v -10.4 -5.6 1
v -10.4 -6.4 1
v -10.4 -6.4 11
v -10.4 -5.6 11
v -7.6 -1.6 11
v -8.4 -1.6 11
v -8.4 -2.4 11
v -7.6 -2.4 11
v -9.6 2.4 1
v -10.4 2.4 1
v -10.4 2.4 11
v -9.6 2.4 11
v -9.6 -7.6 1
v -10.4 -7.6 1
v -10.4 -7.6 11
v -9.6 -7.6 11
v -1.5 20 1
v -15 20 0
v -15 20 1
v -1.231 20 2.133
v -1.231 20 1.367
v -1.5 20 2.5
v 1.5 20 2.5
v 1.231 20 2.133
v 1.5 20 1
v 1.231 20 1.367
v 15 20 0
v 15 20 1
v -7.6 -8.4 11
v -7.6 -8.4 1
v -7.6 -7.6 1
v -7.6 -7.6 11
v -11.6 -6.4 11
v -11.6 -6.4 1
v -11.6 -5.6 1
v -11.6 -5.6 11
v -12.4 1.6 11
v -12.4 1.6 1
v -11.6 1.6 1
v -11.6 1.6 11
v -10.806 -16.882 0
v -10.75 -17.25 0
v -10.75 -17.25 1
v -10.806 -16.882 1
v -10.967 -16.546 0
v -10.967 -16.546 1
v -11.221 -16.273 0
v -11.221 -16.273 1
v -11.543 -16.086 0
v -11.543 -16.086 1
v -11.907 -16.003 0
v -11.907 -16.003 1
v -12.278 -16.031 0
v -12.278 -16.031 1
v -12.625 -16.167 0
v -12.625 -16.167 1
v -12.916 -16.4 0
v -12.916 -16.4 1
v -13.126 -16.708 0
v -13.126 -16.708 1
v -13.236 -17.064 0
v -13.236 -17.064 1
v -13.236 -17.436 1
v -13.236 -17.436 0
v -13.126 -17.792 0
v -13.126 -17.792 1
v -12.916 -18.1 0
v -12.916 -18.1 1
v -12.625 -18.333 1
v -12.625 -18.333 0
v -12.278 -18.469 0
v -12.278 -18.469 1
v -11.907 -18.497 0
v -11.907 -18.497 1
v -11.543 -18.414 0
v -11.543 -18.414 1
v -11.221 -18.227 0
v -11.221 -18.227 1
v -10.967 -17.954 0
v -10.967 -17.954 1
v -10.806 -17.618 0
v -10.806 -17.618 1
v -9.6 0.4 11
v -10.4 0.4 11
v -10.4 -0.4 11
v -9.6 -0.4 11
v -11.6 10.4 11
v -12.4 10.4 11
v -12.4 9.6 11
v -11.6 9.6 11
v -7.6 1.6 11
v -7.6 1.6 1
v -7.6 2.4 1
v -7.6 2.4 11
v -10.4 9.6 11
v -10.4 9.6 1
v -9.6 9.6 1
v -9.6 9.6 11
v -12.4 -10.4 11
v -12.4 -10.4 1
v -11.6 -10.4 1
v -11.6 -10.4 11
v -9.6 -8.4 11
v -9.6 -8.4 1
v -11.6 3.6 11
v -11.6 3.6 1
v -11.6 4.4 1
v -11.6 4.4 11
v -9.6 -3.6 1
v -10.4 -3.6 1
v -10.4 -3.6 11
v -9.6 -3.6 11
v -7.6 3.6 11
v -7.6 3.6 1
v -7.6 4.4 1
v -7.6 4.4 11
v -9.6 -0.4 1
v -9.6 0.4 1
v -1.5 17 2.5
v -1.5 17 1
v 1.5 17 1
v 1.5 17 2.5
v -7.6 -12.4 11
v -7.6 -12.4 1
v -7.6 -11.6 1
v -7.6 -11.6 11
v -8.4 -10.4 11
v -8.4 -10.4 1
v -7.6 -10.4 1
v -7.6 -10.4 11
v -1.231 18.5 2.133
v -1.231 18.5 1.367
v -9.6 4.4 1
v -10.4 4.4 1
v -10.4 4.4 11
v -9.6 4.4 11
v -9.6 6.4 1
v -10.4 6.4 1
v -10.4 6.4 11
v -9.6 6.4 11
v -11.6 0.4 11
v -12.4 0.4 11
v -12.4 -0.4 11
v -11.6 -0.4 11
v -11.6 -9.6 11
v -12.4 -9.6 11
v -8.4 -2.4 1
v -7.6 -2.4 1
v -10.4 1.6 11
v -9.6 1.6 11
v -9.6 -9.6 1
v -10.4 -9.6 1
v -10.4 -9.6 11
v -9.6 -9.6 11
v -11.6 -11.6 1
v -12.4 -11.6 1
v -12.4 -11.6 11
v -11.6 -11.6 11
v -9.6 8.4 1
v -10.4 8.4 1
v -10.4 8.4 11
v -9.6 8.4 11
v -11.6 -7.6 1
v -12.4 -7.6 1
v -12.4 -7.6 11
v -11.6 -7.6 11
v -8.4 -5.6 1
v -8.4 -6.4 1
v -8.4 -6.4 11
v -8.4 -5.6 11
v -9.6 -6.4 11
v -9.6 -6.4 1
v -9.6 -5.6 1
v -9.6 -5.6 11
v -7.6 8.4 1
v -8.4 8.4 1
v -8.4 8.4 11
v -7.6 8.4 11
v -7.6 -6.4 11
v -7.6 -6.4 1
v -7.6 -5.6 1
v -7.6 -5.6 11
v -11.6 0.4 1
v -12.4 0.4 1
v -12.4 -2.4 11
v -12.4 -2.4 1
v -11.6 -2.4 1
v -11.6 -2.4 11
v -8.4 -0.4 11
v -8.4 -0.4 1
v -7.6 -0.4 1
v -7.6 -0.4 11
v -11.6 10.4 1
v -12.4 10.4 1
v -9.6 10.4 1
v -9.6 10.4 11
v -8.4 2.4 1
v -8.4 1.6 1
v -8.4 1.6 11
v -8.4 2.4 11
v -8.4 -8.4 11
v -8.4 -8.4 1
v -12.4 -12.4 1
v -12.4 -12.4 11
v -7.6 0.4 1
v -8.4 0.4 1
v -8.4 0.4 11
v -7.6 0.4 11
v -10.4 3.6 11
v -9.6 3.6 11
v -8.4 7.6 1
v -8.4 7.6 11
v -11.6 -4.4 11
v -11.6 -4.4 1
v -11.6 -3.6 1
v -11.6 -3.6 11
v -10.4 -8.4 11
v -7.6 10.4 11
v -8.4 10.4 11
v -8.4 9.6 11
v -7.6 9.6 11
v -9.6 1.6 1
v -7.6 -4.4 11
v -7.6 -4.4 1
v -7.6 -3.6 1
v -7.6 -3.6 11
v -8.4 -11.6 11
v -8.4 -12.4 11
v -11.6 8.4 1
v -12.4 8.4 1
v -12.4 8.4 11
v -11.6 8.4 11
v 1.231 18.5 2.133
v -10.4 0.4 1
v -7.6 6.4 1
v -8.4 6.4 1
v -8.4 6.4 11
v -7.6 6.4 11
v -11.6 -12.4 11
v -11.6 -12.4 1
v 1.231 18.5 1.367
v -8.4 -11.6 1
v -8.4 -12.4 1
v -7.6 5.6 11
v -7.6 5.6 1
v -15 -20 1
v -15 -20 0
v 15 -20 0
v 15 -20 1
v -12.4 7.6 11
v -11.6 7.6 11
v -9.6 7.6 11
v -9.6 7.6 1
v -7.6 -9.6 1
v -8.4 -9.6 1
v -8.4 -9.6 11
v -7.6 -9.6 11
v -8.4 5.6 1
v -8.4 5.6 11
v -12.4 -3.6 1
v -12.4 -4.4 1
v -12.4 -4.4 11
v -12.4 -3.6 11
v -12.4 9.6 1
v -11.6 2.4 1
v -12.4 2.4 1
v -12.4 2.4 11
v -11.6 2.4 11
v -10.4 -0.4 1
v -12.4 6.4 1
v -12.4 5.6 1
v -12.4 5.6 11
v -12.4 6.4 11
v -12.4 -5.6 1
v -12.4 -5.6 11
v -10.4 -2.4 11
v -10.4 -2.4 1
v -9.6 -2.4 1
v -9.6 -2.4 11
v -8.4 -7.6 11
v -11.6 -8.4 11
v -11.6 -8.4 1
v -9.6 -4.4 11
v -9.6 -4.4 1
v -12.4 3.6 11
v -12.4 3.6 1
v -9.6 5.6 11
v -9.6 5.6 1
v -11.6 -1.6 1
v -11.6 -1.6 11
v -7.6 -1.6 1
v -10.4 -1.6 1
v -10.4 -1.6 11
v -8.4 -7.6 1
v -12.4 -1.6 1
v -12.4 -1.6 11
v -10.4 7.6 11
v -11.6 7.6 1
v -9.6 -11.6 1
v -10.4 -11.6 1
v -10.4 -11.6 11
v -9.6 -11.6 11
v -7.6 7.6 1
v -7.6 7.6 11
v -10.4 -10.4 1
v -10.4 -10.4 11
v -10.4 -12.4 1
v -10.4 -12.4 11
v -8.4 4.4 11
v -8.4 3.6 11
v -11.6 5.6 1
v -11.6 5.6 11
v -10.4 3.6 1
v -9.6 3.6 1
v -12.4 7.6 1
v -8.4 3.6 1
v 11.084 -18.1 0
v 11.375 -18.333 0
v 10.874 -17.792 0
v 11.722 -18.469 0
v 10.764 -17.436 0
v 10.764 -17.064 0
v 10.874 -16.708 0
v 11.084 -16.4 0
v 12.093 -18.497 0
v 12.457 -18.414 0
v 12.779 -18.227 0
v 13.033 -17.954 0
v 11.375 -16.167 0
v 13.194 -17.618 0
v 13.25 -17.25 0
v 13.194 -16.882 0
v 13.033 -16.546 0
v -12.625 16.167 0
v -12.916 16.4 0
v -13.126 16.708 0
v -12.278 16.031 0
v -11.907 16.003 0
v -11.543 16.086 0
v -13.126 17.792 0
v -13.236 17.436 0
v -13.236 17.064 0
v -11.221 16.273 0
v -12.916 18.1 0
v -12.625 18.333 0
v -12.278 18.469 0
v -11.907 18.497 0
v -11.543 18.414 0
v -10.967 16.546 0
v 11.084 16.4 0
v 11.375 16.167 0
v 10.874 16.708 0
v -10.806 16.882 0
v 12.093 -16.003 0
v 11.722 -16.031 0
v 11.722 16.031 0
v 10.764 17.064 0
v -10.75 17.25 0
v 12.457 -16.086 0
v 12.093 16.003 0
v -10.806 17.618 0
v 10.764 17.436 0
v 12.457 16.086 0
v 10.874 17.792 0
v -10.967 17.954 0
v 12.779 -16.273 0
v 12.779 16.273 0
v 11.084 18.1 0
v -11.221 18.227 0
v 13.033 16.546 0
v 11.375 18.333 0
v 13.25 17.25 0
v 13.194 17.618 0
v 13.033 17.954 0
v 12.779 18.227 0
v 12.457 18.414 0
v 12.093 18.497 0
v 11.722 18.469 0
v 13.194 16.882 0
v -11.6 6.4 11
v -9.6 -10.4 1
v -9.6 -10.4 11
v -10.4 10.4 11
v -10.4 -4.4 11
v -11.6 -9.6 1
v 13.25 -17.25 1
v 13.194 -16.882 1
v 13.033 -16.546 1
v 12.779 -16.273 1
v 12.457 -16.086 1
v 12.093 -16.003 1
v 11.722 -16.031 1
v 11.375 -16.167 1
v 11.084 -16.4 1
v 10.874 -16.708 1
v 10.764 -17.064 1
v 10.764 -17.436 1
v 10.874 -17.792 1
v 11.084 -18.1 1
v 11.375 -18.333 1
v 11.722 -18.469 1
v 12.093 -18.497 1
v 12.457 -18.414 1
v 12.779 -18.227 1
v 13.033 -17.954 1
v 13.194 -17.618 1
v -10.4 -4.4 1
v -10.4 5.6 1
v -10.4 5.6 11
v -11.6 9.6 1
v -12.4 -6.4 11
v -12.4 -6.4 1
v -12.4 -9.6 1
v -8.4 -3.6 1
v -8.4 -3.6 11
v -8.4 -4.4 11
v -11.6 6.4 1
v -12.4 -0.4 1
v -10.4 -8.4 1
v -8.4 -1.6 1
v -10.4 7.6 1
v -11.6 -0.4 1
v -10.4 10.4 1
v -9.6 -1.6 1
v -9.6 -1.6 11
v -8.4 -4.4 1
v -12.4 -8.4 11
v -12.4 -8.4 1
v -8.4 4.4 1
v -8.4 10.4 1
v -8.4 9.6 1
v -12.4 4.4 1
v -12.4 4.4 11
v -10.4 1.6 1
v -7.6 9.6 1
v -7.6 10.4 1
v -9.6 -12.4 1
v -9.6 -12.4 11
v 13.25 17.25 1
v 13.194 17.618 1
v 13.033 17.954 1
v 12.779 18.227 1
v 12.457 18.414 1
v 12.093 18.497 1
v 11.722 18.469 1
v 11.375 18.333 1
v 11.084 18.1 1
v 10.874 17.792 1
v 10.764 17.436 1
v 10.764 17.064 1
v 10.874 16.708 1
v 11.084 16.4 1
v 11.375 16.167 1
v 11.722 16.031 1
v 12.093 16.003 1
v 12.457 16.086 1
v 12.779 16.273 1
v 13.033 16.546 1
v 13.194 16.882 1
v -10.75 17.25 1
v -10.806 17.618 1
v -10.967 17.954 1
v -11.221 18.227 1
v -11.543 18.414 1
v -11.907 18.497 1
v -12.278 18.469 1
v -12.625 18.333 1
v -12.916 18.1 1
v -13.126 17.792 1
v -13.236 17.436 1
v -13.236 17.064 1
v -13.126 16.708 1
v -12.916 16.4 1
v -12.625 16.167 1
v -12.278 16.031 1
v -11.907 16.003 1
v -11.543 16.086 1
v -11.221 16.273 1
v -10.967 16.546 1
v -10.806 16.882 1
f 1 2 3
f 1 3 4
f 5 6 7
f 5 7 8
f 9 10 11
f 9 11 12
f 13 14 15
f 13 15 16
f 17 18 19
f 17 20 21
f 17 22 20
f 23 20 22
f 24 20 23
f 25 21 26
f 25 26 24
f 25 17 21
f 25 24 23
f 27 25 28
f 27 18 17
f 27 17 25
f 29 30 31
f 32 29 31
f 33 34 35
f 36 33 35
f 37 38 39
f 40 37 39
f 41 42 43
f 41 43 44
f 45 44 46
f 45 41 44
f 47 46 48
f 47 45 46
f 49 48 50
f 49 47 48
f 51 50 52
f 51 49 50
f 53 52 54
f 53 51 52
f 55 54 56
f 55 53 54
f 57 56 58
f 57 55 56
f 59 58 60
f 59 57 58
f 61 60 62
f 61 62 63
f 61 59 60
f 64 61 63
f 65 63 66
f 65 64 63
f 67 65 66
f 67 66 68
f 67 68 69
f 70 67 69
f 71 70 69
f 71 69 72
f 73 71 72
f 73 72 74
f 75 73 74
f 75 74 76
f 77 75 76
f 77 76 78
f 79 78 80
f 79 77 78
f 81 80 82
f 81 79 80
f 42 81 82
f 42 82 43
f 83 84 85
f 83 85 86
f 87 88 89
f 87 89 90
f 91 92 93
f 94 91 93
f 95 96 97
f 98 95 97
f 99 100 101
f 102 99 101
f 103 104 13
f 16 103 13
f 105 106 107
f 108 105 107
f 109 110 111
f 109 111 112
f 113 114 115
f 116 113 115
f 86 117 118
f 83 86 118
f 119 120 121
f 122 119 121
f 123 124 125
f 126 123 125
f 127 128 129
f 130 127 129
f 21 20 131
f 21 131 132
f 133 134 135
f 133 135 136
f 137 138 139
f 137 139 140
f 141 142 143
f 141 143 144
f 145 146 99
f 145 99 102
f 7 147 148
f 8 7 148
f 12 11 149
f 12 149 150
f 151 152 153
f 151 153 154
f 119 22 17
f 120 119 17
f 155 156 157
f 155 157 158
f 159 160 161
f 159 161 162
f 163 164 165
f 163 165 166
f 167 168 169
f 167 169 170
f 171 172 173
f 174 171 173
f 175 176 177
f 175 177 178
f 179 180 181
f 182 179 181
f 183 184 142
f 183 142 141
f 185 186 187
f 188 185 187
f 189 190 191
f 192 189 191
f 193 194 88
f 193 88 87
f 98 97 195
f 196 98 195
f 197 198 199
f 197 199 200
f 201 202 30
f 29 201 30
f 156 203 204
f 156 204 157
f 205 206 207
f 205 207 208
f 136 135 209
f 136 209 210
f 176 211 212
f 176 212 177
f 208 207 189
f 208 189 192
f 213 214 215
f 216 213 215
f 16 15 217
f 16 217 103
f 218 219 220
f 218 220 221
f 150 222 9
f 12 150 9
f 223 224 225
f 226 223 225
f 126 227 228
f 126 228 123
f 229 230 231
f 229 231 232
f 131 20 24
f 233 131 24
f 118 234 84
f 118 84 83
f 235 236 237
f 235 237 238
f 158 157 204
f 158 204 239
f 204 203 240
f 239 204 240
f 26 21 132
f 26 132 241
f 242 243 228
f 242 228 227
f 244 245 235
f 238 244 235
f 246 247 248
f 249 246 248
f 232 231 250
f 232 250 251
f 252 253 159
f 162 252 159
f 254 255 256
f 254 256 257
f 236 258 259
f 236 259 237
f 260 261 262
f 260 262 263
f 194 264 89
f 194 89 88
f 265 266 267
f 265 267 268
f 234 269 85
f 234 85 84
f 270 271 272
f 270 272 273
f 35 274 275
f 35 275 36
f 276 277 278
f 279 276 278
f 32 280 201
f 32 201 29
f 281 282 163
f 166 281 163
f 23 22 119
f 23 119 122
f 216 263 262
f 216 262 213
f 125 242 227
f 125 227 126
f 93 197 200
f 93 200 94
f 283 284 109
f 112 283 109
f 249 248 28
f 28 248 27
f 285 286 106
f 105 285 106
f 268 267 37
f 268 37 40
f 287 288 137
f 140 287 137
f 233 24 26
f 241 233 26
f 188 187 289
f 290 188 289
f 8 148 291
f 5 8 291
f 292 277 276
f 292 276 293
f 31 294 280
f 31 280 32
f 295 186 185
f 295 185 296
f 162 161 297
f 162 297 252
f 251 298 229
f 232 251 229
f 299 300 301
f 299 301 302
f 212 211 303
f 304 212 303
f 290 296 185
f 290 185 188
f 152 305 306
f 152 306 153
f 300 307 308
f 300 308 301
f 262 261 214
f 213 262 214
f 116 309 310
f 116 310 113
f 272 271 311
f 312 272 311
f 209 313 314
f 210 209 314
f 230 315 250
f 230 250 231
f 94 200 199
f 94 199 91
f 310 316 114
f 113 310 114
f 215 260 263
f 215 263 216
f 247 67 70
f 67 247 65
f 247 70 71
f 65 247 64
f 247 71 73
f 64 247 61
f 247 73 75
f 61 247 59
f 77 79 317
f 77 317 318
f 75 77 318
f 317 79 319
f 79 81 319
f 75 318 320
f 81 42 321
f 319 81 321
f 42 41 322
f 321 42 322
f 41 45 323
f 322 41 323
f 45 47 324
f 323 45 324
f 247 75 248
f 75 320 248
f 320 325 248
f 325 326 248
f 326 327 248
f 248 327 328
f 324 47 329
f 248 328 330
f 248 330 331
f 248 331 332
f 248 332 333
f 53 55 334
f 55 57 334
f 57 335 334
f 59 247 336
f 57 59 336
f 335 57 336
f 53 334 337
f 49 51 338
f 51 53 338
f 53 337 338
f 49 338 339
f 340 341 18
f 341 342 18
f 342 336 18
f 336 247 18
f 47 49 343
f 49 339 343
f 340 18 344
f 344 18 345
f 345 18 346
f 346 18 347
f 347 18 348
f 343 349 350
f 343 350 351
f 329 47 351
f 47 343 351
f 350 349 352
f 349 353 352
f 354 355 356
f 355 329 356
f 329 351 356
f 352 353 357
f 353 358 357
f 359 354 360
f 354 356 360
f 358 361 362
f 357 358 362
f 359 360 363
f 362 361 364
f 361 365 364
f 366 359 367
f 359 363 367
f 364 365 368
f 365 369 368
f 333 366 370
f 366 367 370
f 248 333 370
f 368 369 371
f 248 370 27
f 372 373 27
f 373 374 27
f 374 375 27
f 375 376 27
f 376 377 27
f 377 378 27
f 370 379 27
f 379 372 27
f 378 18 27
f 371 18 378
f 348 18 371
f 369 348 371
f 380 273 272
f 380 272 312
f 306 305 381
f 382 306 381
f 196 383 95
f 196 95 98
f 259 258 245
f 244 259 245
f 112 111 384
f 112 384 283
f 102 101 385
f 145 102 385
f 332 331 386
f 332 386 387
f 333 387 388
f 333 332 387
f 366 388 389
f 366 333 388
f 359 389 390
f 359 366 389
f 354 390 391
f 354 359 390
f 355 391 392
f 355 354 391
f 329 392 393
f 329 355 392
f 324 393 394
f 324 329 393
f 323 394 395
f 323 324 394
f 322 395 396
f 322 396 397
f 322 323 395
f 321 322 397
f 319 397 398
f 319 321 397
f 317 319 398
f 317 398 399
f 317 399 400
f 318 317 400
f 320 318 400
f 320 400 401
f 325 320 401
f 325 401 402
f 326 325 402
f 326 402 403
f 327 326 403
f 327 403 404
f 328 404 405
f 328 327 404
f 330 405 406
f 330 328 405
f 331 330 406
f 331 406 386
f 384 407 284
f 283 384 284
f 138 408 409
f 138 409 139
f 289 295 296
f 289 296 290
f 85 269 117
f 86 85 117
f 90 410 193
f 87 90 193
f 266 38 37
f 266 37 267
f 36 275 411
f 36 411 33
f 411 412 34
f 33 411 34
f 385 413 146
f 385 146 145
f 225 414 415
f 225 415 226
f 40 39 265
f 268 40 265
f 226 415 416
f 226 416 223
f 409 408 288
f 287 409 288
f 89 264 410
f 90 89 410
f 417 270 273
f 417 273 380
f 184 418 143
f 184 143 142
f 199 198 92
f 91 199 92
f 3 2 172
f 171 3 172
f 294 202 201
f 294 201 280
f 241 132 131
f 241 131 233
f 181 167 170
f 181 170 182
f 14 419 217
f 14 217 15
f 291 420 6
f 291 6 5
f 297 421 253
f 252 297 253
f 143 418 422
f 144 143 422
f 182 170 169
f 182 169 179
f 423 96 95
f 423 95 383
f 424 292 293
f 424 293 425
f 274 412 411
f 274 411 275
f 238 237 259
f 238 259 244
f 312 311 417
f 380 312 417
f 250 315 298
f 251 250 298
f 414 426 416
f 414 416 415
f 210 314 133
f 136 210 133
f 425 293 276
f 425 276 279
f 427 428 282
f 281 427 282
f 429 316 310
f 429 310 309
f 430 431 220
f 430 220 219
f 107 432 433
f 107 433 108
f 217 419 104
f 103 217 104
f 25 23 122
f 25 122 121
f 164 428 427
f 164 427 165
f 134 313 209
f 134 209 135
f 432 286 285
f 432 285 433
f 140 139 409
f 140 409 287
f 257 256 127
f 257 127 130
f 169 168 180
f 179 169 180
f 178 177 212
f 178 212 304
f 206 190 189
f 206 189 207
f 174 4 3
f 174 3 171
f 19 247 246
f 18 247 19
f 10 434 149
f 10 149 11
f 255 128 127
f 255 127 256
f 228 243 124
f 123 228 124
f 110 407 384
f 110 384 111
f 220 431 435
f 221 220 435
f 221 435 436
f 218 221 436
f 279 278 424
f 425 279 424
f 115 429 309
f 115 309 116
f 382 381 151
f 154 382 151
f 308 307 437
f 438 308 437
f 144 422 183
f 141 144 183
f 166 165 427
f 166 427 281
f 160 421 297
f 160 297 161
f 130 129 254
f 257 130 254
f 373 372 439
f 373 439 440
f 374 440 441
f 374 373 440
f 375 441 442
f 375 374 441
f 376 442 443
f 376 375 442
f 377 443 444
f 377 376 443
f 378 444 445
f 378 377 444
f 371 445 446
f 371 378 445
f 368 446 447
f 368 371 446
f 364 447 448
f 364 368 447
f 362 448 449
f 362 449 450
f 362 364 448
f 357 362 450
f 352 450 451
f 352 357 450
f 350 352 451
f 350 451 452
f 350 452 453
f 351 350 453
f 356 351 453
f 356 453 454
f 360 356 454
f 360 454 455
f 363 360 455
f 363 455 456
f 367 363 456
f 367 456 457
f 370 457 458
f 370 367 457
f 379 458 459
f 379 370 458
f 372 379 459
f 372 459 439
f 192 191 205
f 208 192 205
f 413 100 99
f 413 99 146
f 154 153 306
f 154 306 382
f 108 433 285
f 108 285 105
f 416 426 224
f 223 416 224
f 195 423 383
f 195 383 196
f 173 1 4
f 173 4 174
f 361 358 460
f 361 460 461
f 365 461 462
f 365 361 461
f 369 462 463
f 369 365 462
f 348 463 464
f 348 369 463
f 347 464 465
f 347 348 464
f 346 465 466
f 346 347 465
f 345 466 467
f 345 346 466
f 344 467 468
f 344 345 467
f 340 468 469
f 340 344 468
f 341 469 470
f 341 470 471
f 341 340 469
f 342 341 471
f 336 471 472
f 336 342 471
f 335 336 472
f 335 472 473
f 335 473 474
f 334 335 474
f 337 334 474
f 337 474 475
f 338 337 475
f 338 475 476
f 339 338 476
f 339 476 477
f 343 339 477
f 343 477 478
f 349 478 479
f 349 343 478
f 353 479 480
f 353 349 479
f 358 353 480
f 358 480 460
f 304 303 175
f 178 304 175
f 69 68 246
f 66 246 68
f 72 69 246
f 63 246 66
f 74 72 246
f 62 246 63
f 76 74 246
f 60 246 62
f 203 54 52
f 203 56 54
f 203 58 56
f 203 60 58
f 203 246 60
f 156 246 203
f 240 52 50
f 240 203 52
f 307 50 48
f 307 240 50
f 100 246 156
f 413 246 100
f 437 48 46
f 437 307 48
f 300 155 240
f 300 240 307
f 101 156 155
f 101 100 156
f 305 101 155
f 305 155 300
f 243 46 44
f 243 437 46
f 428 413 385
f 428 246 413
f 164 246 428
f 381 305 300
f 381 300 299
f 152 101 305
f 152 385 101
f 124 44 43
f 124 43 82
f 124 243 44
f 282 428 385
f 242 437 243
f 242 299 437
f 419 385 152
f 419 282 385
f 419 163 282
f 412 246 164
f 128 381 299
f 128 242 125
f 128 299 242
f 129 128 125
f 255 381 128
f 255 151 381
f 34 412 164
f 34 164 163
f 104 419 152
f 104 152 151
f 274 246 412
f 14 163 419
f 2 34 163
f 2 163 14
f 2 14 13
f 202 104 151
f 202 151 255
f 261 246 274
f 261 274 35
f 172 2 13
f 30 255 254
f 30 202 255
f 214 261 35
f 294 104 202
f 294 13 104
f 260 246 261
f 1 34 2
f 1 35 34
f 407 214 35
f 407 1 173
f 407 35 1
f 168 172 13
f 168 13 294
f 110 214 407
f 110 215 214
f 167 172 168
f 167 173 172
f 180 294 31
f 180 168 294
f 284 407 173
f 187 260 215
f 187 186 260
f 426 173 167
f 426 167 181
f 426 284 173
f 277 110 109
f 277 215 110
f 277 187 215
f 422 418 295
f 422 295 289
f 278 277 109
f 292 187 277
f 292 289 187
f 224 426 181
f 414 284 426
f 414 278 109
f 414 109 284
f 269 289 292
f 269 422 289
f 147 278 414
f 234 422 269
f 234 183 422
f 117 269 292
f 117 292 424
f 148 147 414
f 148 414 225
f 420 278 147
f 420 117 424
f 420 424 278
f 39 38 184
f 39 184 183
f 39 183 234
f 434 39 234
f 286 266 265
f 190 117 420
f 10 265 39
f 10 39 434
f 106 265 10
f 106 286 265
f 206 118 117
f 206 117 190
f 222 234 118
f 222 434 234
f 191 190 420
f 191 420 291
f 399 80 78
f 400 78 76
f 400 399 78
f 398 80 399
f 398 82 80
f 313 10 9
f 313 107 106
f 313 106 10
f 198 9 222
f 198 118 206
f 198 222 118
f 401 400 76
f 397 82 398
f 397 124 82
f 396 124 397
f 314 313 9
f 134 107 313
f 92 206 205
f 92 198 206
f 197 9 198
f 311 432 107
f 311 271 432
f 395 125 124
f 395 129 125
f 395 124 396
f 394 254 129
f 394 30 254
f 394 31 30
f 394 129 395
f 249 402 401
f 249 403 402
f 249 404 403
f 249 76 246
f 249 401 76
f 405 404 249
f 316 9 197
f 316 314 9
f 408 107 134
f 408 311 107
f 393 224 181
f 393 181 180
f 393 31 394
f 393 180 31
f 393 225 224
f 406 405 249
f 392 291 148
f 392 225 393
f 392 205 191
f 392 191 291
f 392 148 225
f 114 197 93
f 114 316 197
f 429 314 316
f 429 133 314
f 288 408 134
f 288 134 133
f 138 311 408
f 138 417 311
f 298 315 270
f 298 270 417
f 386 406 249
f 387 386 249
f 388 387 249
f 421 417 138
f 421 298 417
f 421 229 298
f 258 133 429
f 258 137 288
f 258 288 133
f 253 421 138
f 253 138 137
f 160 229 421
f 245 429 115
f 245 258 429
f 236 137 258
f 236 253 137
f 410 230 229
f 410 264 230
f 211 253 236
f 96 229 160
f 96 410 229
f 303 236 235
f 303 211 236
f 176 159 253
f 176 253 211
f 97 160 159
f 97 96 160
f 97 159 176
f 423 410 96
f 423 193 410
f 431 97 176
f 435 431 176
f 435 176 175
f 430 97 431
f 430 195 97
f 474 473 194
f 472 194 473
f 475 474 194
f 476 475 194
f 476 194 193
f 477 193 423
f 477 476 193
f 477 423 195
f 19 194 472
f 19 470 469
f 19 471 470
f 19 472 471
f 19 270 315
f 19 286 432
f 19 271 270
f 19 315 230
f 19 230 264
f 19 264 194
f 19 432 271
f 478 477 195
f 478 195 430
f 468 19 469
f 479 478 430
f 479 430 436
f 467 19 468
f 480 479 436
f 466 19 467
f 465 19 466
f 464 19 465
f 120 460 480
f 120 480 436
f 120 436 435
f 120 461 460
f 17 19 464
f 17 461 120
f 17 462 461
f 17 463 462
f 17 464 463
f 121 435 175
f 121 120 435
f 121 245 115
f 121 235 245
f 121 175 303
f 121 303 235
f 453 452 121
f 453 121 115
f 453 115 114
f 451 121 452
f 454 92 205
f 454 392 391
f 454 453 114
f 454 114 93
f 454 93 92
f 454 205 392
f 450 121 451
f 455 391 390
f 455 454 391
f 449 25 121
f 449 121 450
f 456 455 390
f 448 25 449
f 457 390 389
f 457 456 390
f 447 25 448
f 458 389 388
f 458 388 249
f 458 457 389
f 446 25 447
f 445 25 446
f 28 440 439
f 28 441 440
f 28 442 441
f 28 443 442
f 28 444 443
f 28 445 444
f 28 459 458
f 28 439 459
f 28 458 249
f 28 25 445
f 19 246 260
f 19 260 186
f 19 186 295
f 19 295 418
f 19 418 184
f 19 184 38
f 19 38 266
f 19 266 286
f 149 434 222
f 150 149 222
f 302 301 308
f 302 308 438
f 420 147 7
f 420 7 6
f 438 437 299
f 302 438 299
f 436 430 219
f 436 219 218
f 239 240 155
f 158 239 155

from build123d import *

# Parameters (mm, degrees)
SKETCH_1_W          = 30
SKETCH_1_H          = 40
SKETCH_1_R          = 1.25
EXTRUDE_1_DEPTH     = 1
SKETCH_2_W          = 0.8
SKETCH_2_H          = 0.8
EXTRUDE_2_DEPTH     = 10
SKETCH_3_W          = 3
SKETCH_3_H          = 1.5
EXTRUDE_3_DEPTH     = 3
SKETCH_4_W          = 2.462162708
SKETCH_4_H          = 0.766502898
CUT_EXTRUDE_1_DEPTH = 1.5


with BuildPart() as part:
    # 草图1 → 凸台-拉伸1 (new body)
    with BuildSketch(Plane.XY):
        Rectangle(SKETCH_1_W, SKETCH_1_H)
        with Locations((-12, 17.25)):
            Circle(SKETCH_1_R, mode=Mode.SUBTRACT)
        with Locations((12, 17.25)):
            Circle(SKETCH_1_R, mode=Mode.SUBTRACT)
        with Locations((12, -17.25)):
            Circle(SKETCH_1_R, mode=Mode.SUBTRACT)
        with Locations((-12, -17.25)):
            Circle(SKETCH_1_R, mode=Mode.SUBTRACT)
    extrude(amount=EXTRUDE_1_DEPTH)

    # 草图2 → 凸台-拉伸2 (add)
    with BuildSketch(Plane.XY.offset(1)):
        with Locations((-12, -10)):
            Rectangle(SKETCH_2_W, SKETCH_2_H)
        with Locations((-12, -12)):
            Rectangle(SKETCH_2_W, SKETCH_2_H)
        with Locations((-12, -8)):
            Rectangle(SKETCH_2_W, SKETCH_2_H)
        with Locations((-12, -6)):
            Rectangle(SKETCH_2_W, SKETCH_2_H)
        with Locations((-12, -4)):
            Rectangle(SKETCH_2_W, SKETCH_2_H)
        with Locations((-12, -2)):
            Rectangle(SKETCH_2_W, SKETCH_2_H)
        with Locations((-12, 0)):
            Rectangle(SKETCH_2_W, SKETCH_2_H)
        with Locations((-12, 2)):
            Rectangle(SKETCH_2_W, SKETCH_2_H)
        with Locations((-12, 4)):
            Rectangle(SKETCH_2_W, SKETCH_2_H)
        with Locations((-12, 6)):
            Rectangle(SKETCH_2_W, SKETCH_2_H)
        with Locations((-12, 8)):
            Rectangle(SKETCH_2_W, SKETCH_2_H)
        with Locations((-12, 10)):
            Rectangle(SKETCH_2_W, SKETCH_2_H)
        with Locations((-10, -10)):
            Rectangle(SKETCH_2_W, SKETCH_2_H)
        with Locations((-10, -12)):
            Rectangle(SKETCH_2_W, SKETCH_2_H)
        with Locations((-10, -8)):
            Rectangle(SKETCH_2_W, SKETCH_2_H)
        with Locations((-10, -6)):
            Rectangle(SKETCH_2_W, SKETCH_2_H)
        with Locations((-10, -4)):
            Rectangle(SKETCH_2_W, SKETCH_2_H)
        with Locations((-10, -2)):
            Rectangle(SKETCH_2_W, SKETCH_2_H)
        with Locations((-10, 0)):
            Rectangle(SKETCH_2_W, SKETCH_2_H)
        with Locations((-10, 2)):
            Rectangle(SKETCH_2_W, SKETCH_2_H)
        with Locations((-10, 4)):
            Rectangle(SKETCH_2_W, SKETCH_2_H)
        with Locations((-10, 6)):
            Rectangle(SKETCH_2_W, SKETCH_2_H)
        with Locations((-10, 8)):
            Rectangle(SKETCH_2_W, SKETCH_2_H)
        with Locations((-10, 10)):
            Rectangle(SKETCH_2_W, SKETCH_2_H)
        with Locations((-8, -10)):
            Rectangle(SKETCH_2_W, SKETCH_2_H)
        with Locations((-8, -12)):
            Rectangle(SKETCH_2_W, SKETCH_2_H)
        with Locations((-8, -8)):
            Rectangle(SKETCH_2_W, SKETCH_2_H)
        with Locations((-8, -6)):
            Rectangle(SKETCH_2_W, SKETCH_2_H)
        with Locations((-8, -4)):
            Rectangle(SKETCH_2_W, SKETCH_2_H)
        with Locations((-8, -2)):
            Rectangle(SKETCH_2_W, SKETCH_2_H)
        with Locations((-8, 0)):
            Rectangle(SKETCH_2_W, SKETCH_2_H)
        with Locations((-8, 2)):
            Rectangle(SKETCH_2_W, SKETCH_2_H)
        with Locations((-8, 4)):
            Rectangle(SKETCH_2_W, SKETCH_2_H)
        with Locations((-8, 6)):
            Rectangle(SKETCH_2_W, SKETCH_2_H)
        with Locations((-8, 8)):
            Rectangle(SKETCH_2_W, SKETCH_2_H)
        with Locations((-8, 10)):
            Rectangle(SKETCH_2_W, SKETCH_2_H)
    extrude(amount=EXTRUDE_2_DEPTH)

    # 草图3 → 凸台-拉伸3 (add)
    with BuildSketch(Plane(origin=(0, 20, 0), x_dir=(1, 0, 0), z_dir=(0, 1, 0))):
        with Locations((0, -1.75)):
            Rectangle(SKETCH_3_W, SKETCH_3_H)
    extrude(amount=-EXTRUDE_3_DEPTH)

    # 草图4 → 切除-拉伸1 (cut)
    with BuildSketch(Plane(origin=(0, 20, 0), x_dir=(1, 0, 0), z_dir=(0, 1, 0))):
        with Locations((0, -1.75)):
            Rectangle(SKETCH_4_W, SKETCH_4_H)
    extrude(amount=-CUT_EXTRUDE_1_DEPTH, mode=Mode.SUBTRACT)


solid = part.part
